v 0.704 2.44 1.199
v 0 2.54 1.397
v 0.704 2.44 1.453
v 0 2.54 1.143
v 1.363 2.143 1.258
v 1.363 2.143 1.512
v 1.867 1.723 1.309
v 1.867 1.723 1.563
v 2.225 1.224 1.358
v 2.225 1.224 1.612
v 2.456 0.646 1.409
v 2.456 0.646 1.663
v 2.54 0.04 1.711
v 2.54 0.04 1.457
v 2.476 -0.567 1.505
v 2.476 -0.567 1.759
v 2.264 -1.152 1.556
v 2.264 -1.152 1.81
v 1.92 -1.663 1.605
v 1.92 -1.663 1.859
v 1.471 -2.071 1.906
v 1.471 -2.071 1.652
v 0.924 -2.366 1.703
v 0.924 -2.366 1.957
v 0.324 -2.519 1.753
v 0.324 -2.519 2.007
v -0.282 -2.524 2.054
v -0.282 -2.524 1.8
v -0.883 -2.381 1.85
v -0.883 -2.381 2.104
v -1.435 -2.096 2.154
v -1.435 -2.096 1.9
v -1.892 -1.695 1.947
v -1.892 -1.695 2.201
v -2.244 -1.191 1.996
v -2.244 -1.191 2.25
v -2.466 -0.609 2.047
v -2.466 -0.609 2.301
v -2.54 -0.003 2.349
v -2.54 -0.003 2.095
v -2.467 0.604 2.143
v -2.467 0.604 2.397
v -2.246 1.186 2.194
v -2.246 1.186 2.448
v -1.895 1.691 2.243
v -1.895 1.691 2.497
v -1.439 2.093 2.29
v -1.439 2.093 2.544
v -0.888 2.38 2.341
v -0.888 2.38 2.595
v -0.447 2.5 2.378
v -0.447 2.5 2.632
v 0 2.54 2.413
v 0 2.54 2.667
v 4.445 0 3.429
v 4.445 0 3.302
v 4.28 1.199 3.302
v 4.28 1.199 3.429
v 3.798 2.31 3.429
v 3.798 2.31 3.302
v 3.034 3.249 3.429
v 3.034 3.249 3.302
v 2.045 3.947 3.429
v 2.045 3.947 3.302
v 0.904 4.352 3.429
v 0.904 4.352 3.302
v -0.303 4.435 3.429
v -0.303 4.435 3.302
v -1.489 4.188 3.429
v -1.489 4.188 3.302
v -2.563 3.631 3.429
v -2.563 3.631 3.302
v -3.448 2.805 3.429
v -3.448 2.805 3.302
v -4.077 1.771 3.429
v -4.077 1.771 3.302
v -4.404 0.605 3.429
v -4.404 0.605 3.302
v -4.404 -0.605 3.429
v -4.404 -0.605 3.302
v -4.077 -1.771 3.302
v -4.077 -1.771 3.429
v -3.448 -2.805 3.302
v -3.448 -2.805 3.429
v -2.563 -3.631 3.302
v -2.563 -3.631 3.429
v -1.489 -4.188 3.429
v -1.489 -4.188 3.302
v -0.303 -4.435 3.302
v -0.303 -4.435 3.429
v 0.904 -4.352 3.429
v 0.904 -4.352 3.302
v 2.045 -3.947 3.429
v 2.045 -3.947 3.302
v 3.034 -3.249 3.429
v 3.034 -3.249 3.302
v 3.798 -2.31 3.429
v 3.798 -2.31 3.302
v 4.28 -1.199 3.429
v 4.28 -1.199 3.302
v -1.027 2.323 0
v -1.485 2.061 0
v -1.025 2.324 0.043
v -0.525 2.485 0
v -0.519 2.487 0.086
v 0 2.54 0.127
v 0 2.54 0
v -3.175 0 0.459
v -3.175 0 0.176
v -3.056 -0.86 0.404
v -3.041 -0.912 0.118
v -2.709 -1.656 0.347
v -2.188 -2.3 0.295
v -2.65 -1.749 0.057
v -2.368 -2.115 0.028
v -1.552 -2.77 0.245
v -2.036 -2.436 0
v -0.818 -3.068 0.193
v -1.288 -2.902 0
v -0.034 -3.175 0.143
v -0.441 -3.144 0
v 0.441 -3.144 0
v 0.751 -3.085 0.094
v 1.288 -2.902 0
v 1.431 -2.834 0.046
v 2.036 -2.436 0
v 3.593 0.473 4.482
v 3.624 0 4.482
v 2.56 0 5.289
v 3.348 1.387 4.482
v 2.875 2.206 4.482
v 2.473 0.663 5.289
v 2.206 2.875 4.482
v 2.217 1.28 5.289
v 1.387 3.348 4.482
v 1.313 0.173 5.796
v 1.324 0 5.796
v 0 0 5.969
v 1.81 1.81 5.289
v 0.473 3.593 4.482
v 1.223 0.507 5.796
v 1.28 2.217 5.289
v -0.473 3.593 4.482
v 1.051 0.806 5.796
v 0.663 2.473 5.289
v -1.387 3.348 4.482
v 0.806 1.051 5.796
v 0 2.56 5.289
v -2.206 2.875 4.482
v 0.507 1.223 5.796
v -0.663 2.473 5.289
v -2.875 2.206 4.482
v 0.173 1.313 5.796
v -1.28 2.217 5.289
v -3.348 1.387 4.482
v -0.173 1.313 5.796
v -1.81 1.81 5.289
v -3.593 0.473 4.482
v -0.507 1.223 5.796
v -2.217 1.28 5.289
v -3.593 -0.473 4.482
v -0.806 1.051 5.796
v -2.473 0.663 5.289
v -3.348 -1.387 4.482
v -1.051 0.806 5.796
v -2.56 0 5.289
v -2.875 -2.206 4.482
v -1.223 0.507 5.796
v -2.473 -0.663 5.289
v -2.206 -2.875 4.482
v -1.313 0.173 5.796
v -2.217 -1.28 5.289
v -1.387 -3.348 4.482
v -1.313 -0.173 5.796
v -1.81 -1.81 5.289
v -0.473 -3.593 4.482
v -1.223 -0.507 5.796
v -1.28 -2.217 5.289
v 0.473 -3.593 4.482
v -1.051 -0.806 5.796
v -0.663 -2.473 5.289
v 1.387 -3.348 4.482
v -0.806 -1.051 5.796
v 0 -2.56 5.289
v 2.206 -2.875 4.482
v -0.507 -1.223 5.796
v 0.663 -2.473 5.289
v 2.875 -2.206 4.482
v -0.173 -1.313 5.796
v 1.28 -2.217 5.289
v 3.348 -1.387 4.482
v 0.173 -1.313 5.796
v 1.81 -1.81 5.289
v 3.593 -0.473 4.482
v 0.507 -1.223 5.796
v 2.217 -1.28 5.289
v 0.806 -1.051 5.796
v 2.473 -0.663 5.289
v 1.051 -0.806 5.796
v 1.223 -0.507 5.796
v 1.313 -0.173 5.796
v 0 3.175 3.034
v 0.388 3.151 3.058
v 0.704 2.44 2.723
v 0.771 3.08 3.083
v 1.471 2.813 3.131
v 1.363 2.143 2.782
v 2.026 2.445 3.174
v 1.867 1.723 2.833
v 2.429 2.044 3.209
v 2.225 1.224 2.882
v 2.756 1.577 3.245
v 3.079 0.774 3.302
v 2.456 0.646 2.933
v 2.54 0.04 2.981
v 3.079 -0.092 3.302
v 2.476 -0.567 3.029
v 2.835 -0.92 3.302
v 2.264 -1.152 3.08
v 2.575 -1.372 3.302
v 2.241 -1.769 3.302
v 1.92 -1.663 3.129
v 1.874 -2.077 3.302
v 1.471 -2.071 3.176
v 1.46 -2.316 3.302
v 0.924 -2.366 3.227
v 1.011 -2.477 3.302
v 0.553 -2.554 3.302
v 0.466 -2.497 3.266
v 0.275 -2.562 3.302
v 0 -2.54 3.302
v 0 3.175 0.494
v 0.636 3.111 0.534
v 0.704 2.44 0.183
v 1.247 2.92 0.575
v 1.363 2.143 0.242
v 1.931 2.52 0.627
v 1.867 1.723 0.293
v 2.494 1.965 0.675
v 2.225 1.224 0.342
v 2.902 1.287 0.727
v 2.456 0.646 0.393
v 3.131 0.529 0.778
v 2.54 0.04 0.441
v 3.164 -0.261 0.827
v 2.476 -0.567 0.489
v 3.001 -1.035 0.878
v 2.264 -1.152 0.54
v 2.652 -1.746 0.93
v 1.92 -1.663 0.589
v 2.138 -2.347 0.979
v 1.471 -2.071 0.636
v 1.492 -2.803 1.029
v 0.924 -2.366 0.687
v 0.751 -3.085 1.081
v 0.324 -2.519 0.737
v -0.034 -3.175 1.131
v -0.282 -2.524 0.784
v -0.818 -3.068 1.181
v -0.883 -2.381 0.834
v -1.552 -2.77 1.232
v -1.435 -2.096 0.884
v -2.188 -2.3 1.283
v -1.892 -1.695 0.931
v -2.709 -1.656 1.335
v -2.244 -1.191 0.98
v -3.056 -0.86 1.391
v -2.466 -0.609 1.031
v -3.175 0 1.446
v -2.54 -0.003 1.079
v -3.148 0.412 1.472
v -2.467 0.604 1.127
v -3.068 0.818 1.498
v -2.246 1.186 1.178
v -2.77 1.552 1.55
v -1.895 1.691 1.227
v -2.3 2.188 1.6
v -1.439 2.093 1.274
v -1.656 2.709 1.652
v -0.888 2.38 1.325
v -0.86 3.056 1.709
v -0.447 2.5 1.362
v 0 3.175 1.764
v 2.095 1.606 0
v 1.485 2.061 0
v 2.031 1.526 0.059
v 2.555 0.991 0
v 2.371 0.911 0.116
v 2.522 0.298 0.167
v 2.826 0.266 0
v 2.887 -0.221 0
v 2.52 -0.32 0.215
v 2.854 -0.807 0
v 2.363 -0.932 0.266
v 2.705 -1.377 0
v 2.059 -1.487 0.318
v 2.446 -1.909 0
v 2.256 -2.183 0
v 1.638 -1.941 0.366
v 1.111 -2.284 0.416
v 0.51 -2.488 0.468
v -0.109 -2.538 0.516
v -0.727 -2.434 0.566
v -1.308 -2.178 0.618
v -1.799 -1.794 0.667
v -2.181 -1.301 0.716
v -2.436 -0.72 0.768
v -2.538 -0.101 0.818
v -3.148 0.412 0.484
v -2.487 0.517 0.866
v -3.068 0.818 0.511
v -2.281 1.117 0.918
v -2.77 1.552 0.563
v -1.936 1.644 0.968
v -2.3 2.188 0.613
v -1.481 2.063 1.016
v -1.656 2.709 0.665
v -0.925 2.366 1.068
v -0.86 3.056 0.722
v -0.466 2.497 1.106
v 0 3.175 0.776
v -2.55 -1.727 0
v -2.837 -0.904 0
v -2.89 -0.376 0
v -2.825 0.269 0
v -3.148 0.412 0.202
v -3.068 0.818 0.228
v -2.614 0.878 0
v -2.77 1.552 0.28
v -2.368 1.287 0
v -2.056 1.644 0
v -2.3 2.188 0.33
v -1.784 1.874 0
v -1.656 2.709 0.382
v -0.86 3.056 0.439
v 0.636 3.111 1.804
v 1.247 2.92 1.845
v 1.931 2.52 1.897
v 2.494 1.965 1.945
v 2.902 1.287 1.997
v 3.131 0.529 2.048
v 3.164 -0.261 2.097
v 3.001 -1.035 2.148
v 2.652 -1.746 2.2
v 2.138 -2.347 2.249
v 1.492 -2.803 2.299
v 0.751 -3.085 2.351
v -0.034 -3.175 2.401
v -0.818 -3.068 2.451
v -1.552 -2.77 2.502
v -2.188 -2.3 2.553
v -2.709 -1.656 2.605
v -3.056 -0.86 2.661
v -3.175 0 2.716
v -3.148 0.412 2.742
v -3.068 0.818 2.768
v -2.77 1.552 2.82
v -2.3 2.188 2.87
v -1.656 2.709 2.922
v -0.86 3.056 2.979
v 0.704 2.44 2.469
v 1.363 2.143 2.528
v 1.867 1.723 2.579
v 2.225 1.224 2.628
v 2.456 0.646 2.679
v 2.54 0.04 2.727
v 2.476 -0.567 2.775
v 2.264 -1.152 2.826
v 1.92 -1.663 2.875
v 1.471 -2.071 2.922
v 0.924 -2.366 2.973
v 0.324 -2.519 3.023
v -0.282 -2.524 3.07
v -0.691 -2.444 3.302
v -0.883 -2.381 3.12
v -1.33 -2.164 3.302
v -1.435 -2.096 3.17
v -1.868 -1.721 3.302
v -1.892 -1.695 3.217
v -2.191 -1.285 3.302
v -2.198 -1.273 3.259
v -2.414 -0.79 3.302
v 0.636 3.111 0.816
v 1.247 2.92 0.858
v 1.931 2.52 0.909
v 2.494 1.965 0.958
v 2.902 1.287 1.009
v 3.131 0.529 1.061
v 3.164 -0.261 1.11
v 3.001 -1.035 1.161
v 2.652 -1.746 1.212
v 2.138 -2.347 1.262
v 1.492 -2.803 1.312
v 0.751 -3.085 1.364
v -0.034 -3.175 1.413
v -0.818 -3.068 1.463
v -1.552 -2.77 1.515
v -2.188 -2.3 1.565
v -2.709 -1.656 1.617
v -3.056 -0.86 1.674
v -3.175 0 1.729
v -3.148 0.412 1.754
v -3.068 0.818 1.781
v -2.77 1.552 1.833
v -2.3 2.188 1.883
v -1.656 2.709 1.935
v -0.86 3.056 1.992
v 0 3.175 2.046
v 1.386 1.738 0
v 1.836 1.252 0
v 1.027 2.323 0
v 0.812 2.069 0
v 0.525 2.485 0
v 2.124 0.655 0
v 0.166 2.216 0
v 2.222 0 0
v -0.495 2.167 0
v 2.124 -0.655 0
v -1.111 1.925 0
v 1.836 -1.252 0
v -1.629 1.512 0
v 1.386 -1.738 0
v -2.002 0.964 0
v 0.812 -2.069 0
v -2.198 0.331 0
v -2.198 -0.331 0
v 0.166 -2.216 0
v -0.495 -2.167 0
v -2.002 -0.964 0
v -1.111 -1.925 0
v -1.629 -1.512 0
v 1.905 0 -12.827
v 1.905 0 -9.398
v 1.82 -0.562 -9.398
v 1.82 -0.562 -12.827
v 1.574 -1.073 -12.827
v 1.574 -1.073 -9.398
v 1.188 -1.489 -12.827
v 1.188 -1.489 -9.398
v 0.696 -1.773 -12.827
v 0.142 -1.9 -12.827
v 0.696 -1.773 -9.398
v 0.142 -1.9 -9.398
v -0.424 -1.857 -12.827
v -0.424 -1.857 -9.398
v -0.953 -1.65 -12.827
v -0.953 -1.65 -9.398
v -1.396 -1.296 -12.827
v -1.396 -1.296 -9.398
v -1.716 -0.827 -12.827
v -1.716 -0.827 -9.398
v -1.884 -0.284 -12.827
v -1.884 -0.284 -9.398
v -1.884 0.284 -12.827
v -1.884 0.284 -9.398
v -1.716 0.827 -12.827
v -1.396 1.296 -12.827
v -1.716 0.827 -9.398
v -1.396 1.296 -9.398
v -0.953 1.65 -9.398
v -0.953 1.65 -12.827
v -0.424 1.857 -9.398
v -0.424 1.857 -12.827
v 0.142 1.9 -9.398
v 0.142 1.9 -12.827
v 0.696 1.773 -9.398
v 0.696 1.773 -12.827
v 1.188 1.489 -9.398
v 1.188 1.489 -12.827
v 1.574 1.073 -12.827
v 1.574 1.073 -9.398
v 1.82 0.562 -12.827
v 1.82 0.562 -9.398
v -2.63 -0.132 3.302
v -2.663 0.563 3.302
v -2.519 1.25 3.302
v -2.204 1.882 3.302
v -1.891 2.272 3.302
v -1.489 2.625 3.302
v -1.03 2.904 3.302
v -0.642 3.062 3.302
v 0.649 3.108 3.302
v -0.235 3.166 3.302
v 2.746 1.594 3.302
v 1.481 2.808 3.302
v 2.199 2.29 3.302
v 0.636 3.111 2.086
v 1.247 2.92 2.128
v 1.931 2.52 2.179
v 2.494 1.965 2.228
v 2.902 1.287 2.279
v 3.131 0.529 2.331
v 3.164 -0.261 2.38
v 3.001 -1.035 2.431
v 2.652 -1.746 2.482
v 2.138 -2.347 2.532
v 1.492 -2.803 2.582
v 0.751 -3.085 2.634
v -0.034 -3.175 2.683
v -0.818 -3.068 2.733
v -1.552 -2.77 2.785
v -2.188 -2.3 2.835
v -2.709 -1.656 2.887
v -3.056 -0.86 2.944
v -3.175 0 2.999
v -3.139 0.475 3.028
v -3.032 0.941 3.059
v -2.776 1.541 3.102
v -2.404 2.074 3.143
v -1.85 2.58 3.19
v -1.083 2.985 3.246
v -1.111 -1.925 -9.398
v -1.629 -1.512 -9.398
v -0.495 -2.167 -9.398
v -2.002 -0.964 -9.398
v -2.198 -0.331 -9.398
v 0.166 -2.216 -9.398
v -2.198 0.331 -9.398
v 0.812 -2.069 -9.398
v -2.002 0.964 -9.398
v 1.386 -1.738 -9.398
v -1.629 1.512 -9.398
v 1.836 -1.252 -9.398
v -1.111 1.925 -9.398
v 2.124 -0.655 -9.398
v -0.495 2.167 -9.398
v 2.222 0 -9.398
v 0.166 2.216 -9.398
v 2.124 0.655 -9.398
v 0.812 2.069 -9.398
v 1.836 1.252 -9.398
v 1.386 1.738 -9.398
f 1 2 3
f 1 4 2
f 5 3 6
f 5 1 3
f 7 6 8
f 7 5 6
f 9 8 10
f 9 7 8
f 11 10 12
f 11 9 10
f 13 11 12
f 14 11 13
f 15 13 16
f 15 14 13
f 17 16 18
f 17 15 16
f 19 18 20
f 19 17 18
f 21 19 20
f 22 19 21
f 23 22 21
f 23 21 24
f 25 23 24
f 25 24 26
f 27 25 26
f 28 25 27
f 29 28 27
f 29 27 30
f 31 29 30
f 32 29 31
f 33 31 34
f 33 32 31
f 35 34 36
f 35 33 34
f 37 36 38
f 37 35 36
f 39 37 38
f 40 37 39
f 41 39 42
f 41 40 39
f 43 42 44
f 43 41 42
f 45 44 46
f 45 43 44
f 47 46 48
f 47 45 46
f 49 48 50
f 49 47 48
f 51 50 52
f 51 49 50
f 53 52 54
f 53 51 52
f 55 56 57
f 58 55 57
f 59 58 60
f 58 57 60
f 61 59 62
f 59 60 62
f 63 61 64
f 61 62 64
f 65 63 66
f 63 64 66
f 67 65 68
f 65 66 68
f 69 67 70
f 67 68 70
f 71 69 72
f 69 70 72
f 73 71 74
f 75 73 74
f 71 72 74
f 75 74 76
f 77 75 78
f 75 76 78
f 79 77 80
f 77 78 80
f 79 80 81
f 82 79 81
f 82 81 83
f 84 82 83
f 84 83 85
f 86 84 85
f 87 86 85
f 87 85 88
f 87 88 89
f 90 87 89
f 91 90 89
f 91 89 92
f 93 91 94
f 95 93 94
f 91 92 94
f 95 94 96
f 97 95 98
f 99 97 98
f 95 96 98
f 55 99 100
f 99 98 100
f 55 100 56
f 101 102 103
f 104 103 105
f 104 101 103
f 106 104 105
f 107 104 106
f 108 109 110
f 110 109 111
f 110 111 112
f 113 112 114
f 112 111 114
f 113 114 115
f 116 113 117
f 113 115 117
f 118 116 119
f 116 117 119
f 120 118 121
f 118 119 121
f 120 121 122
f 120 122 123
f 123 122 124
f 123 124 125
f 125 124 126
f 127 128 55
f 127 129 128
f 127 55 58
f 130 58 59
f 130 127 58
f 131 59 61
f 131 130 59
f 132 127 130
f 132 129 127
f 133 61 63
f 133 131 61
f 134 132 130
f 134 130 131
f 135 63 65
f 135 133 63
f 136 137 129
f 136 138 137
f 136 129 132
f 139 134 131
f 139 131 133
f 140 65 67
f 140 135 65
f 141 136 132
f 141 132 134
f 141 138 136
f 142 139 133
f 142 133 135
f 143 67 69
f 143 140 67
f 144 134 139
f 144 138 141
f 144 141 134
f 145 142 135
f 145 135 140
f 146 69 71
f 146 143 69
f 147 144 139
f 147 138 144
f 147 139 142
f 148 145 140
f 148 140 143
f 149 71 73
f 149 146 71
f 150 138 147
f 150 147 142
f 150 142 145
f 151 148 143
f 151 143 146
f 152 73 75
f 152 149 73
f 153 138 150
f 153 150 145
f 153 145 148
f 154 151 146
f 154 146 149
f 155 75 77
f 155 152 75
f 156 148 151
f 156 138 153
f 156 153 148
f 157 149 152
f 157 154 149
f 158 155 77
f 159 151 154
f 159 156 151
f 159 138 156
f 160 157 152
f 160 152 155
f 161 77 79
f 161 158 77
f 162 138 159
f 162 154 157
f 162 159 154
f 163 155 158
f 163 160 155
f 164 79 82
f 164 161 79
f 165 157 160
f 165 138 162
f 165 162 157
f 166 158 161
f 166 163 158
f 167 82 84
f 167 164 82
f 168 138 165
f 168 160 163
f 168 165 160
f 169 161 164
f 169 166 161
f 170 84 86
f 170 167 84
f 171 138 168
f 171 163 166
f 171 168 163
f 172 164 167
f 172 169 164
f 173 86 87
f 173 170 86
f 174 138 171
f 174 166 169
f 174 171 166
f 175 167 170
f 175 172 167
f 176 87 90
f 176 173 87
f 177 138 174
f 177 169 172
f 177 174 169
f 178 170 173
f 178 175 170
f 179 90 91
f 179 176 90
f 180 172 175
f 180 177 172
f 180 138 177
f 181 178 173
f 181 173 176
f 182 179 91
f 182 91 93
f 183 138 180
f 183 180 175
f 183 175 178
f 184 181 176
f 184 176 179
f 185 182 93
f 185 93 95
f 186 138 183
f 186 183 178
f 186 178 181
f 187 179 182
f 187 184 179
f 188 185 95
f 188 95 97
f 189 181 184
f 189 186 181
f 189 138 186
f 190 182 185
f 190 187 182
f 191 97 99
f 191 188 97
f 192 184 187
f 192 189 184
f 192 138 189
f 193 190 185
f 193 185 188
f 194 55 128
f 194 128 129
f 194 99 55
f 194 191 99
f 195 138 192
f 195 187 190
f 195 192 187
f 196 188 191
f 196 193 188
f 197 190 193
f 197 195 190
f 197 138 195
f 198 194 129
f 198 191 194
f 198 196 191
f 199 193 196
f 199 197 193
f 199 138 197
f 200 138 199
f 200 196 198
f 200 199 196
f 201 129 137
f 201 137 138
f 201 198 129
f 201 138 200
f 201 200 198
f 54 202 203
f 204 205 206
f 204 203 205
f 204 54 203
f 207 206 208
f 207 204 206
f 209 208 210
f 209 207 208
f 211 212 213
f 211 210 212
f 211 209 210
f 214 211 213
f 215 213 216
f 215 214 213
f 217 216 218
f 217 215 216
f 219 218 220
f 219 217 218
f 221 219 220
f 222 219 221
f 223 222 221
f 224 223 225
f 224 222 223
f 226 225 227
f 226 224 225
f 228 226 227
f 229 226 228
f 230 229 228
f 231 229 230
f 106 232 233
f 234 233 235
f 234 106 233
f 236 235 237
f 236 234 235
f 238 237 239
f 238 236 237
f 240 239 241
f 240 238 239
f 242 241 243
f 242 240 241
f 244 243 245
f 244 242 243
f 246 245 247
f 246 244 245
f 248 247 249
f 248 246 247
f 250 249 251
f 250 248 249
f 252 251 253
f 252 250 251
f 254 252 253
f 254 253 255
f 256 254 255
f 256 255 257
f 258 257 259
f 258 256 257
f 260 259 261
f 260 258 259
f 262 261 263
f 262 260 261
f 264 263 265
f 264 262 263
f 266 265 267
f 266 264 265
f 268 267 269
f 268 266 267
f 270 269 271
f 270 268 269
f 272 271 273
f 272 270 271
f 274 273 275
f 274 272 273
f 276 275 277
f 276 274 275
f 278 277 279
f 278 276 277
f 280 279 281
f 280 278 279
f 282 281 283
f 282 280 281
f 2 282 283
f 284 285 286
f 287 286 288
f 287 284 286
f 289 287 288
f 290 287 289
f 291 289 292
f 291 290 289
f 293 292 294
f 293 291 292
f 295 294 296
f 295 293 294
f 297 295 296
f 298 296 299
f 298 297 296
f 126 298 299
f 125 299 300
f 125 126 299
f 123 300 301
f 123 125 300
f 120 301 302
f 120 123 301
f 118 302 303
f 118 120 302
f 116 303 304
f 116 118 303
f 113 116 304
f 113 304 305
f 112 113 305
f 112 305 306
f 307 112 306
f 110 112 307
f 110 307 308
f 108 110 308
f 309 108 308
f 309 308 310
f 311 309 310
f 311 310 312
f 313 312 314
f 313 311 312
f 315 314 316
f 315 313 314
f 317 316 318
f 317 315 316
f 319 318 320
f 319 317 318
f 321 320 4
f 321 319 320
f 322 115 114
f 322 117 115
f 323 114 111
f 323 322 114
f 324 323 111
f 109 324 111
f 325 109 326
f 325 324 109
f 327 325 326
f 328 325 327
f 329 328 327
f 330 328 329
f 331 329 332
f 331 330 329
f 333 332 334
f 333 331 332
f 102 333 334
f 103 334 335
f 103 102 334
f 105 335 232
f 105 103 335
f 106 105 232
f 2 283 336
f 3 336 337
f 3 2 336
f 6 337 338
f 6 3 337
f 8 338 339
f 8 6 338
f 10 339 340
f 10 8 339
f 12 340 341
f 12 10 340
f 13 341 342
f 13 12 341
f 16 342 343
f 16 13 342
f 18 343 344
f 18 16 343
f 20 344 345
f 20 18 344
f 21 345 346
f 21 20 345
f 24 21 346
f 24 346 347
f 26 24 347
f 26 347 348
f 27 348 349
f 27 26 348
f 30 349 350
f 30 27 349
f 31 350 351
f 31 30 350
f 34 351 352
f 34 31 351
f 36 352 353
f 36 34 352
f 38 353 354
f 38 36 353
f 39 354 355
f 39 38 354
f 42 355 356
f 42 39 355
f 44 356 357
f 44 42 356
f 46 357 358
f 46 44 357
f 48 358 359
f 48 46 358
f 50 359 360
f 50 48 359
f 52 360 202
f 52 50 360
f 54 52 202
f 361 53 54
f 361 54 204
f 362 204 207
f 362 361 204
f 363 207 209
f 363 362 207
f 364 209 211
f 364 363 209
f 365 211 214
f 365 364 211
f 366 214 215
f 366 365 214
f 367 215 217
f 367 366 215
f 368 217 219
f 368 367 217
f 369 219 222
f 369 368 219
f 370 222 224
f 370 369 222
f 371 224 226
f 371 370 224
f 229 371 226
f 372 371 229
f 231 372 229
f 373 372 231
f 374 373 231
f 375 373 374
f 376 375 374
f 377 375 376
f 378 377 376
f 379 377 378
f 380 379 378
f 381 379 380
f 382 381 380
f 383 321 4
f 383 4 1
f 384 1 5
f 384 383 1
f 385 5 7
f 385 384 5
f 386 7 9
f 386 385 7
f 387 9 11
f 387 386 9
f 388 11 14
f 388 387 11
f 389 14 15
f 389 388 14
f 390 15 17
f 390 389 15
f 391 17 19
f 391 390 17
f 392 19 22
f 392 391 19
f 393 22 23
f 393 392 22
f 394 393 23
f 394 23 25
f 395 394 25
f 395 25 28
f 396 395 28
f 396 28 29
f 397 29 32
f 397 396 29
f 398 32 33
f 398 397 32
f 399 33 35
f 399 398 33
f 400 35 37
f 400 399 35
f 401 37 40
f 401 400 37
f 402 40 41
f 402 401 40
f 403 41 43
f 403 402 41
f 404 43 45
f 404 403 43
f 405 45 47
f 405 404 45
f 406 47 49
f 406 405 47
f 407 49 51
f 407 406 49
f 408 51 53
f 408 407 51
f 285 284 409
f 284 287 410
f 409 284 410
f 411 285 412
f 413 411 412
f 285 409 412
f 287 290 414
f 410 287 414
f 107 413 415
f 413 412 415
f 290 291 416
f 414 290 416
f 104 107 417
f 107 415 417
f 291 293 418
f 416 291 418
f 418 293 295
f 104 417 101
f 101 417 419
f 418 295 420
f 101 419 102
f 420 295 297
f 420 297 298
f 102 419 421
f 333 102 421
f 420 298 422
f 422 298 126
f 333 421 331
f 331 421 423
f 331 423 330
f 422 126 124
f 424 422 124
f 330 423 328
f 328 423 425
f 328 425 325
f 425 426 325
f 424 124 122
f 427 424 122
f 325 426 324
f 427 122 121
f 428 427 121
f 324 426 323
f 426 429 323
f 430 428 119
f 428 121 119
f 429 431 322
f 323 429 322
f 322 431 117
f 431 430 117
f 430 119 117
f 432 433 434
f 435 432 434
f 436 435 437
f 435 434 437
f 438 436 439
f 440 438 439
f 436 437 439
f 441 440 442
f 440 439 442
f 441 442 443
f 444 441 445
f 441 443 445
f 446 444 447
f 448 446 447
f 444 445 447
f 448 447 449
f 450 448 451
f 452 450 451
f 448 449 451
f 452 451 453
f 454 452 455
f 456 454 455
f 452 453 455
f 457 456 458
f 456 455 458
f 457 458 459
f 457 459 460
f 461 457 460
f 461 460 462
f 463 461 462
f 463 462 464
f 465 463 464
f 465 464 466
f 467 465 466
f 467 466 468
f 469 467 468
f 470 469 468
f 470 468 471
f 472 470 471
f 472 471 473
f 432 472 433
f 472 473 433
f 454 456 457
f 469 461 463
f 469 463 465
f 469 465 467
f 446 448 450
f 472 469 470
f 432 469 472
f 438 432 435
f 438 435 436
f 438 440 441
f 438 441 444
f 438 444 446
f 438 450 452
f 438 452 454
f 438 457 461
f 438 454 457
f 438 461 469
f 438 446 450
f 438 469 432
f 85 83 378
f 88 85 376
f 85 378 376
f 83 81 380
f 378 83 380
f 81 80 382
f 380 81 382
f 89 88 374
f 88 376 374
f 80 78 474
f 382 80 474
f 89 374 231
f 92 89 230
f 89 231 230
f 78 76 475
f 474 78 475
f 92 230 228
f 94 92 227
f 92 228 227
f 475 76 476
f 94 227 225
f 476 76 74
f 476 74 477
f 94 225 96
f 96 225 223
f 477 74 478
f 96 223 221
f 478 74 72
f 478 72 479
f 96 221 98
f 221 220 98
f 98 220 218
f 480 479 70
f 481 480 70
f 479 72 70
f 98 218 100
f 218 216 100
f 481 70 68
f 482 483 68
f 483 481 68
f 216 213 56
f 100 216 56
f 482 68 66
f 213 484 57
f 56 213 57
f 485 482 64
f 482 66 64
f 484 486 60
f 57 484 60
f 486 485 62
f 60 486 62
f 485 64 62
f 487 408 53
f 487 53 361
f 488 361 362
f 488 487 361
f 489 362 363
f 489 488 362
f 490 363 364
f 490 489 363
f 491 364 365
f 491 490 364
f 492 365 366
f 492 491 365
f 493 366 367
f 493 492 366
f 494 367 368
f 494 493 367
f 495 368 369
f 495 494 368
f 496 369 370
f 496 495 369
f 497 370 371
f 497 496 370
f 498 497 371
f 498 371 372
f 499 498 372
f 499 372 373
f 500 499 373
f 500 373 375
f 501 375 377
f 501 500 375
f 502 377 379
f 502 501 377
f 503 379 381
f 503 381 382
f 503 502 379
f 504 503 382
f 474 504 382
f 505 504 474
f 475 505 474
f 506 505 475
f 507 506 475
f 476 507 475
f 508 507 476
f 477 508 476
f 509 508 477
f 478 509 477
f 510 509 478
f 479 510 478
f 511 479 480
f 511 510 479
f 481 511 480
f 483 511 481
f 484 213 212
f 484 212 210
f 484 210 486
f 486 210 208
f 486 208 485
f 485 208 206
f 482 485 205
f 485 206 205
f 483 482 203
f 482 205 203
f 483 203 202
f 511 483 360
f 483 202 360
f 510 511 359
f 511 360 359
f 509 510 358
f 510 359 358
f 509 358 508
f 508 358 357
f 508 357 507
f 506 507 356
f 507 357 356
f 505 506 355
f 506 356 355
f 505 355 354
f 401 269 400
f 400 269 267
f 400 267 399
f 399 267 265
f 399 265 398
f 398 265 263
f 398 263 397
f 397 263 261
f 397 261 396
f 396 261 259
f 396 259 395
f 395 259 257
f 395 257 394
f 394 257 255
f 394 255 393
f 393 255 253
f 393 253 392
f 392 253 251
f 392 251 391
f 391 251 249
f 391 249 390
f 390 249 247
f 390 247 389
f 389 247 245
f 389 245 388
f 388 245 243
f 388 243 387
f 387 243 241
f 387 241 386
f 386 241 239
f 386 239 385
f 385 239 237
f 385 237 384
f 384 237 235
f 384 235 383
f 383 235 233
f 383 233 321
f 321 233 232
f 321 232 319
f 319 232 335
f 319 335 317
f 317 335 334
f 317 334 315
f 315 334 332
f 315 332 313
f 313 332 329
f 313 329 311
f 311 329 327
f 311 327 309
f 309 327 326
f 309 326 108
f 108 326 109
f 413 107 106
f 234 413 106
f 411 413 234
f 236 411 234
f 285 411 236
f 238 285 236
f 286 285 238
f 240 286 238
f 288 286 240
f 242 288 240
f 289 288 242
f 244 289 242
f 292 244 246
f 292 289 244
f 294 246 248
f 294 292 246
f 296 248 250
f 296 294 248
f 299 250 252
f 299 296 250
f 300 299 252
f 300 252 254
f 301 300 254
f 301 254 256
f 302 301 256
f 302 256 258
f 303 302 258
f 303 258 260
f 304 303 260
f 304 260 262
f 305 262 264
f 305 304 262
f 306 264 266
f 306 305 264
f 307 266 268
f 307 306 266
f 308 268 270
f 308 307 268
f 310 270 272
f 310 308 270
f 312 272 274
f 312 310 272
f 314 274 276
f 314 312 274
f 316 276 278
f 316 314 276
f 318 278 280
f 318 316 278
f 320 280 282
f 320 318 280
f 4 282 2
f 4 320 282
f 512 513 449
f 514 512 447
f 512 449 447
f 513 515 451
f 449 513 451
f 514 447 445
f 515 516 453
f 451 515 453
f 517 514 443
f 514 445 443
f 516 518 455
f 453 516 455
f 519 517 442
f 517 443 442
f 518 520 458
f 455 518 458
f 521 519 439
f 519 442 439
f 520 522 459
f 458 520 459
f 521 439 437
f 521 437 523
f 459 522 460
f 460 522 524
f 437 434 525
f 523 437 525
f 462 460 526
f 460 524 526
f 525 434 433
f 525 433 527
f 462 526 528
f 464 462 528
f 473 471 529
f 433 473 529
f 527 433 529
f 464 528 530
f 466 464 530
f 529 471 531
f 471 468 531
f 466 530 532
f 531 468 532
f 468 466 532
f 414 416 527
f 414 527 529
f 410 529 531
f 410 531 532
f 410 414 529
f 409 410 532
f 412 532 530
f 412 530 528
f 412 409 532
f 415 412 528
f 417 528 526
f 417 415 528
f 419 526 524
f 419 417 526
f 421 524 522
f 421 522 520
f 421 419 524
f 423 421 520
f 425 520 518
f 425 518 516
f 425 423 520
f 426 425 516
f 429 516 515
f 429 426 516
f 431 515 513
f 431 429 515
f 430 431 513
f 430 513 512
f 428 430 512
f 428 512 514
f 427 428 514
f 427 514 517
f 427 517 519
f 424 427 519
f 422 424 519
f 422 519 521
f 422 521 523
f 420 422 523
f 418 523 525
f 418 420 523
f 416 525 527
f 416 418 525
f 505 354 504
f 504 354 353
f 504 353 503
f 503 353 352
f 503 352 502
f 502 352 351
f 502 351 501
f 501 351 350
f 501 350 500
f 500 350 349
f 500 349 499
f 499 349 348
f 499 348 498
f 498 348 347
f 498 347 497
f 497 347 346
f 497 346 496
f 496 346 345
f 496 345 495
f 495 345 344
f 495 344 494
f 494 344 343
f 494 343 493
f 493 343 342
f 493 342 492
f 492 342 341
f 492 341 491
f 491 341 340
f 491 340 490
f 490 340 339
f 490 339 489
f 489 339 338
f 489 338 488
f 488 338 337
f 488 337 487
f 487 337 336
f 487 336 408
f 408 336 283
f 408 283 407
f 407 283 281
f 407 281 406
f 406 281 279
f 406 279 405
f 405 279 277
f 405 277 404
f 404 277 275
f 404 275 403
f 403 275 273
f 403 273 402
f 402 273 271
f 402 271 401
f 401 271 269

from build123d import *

# Parameters (mm, degrees)
SKETCH3_R           = 3.175
BOSS_EXTRUDE1_DEPTH = 3.302
CUT_SWEEP1_PITCH    = 1.27
SKETCH8_R           = 2.2225
BOSS_EXTRUDE3_DEPTH = 9.398
SKETCH10_R          = 1.905
BOSS_EXTRUDE5_DEPTH = 3.429
SKETCH11_R          = 4.445
BOSS_EXTRUDE6_DEPTH = 0.127
DOME1_FACE_RADIUS   = 4.445
DOME1_HEIGHT        = 2.54


with BuildPart() as part:
    # Sketch3 → Boss-Extrude1 (new body)
    with BuildSketch(Plane.XY):
        with Locations(Location((0, 0, 0), (0, 0, 180))):
            Circle(SKETCH3_R)
    extrude(amount=BOSS_EXTRUDE1_DEPTH)

    # Cut-Sweep1: arcs per turn and ends read off the stored shape
    # Cut-Sweep1: the profile of Sketch5 profile screwed along a left-hand helix through 4.5 turns, 8 arcs to a turn; built about Z, then put on its axis
    cut_sweep1_z = Axis((0, 0, 0), (0, 0, 1))
    cut_sweep1_corners = [(2.54, 0, -1.397), (3.1753, 0, -1.763790626), (3.1753, 0, -0.776209374), (2.54, 0, -1.143)]
    with BuildLine(mode=Mode.PRIVATE) as cut_sweep1_profile:
        Line(cut_sweep1_corners[0], cut_sweep1_corners[1])
        Line(cut_sweep1_corners[1], cut_sweep1_corners[2])
        Line(cut_sweep1_corners[2], cut_sweep1_corners[3])
        Line(cut_sweep1_corners[3], cut_sweep1_corners[0])
    cut_sweep1_cap = Face(cut_sweep1_profile.wire())
    cut_sweep1_turn_angles = [0, -22.5, -45, -67.5, -90, -112.5, -135, -157.5, -180, -202.5, -225, -247.5, -270, -292.5, -315, -337.5, -360]
    cut_sweep1_turn_weights = [1, 0.9238795325112867, 1, 0.9238795325112867, 1, 0.9238795325112867, 1, 0.9238795325112867, 1, 0.9238795325112867, 1, 0.9238795325112867, 1, 0.9238795325112867, 1, 0.9238795325112867, 1]
    cut_sweep1_turn_rails = [Edge.make_bspline([Vector(p[0], p[1], 0).rotate(cut_sweep1_z, cut_sweep1_turn_angles[k]) / cut_sweep1_turn_weights[k] + Vector(0, 0, p[2] + -CUT_SWEEP1_PITCH * cut_sweep1_turn_angles[k] / 360) for k in range(17)], [0, 0, 0, 1, 1, 2, 2, 3, 3, 4, 4, 5, 5, 6, 6, 7, 7, 8, 8, 8], 2, cut_sweep1_turn_weights) for p in cut_sweep1_corners]
    cut_sweep1_turn_sides = [Face.make_surface_from_curves(cut_sweep1_turn_rails[p[0]], cut_sweep1_turn_rails[p[1]]) for p in [(0, 1), (1, 2), (2, 3), (3, 0)]]
    cut_sweep1_last_angles = [-1440, -1462.5, -1485, -1507.5, -1530, -1552.5, -1575, -1597.5, -1620]
    cut_sweep1_last_weights = [1, 0.9238795325112867, 1, 0.9238795325112867, 1, 0.9238795325112867, 1, 0.9238795325112867, 1]
    cut_sweep1_last_rails = [Edge.make_bspline([Vector(p[0], p[1], 0).rotate(cut_sweep1_z, cut_sweep1_last_angles[k]) / cut_sweep1_last_weights[k] + Vector(0, 0, p[2] + -CUT_SWEEP1_PITCH * cut_sweep1_last_angles[k] / 360) for k in range(9)], [0, 0, 0, 1, 1, 2, 2, 3, 3, 4, 4, 4], 2, cut_sweep1_last_weights) for p in cut_sweep1_corners]
    cut_sweep1_last_sides = [Face.make_surface_from_curves(cut_sweep1_last_rails[p[0]], cut_sweep1_last_rails[p[1]]) for p in [(0, 1), (1, 2), (2, 3), (3, 0)]]
    cut_sweep1 = Plane(origin=(0, 0, 0), x_dir=(0, 1, 0), z_dir=(0, 0, 1)) * Solid(Shell([*[p.moved(Location((0, 0, CUT_SWEEP1_PITCH * i))) for i in range(4) for p in cut_sweep1_turn_sides], *cut_sweep1_last_sides, cut_sweep1_cap, cut_sweep1_cap.rotate(cut_sweep1_z, -1620).moved(Location((0, 0, -CUT_SWEEP1_PITCH * -1620 / 360)))]))
    add(cut_sweep1, mode=Mode.SUBTRACT)

    # Sketch8 → Boss-Extrude3 (add)
    with BuildSketch(Plane.XY):
        Circle(SKETCH8_R)
    extrude(amount=-BOSS_EXTRUDE3_DEPTH)

    # Sketch10 → Boss-Extrude5 (add)
    with BuildSketch(Plane(origin=(0, 0, -9.398), x_dir=(-1, 0, 0), z_dir=(0, 0, -1))):
        with Locations(Location((0, 0, 0), (0, 0, 180))):
            Circle(SKETCH10_R)
    extrude(amount=BOSS_EXTRUDE5_DEPTH)

    # Sketch11 → Boss-Extrude6 (add)
    with BuildSketch(Plane.XY.offset(3.302)):
        Circle(SKETCH11_R)
    extrude(amount=BOSS_EXTRUDE6_DEPTH)

    # Dome1: a dome of height H over a round flat face of radius A is a cap of a sphere of radius (A * A + H * H) / (2 * H)
    dome1_r = (DOME1_FACE_RADIUS * DOME1_FACE_RADIUS + DOME1_HEIGHT * DOME1_HEIGHT) / (2 * DOME1_HEIGHT)
    dome1_base = Plane((0, 0, 3.429), z_dir=(0, 0, 1))
    with Locations(dome1_base.offset(DOME1_HEIGHT - dome1_r)):
        dome1_ball = Sphere(dome1_r, mode=Mode.PRIVATE)
    add(split(dome1_ball, bisect_by=dome1_base, keep=Keep.TOP, mode=Mode.PRIVATE))


solid = part.part
